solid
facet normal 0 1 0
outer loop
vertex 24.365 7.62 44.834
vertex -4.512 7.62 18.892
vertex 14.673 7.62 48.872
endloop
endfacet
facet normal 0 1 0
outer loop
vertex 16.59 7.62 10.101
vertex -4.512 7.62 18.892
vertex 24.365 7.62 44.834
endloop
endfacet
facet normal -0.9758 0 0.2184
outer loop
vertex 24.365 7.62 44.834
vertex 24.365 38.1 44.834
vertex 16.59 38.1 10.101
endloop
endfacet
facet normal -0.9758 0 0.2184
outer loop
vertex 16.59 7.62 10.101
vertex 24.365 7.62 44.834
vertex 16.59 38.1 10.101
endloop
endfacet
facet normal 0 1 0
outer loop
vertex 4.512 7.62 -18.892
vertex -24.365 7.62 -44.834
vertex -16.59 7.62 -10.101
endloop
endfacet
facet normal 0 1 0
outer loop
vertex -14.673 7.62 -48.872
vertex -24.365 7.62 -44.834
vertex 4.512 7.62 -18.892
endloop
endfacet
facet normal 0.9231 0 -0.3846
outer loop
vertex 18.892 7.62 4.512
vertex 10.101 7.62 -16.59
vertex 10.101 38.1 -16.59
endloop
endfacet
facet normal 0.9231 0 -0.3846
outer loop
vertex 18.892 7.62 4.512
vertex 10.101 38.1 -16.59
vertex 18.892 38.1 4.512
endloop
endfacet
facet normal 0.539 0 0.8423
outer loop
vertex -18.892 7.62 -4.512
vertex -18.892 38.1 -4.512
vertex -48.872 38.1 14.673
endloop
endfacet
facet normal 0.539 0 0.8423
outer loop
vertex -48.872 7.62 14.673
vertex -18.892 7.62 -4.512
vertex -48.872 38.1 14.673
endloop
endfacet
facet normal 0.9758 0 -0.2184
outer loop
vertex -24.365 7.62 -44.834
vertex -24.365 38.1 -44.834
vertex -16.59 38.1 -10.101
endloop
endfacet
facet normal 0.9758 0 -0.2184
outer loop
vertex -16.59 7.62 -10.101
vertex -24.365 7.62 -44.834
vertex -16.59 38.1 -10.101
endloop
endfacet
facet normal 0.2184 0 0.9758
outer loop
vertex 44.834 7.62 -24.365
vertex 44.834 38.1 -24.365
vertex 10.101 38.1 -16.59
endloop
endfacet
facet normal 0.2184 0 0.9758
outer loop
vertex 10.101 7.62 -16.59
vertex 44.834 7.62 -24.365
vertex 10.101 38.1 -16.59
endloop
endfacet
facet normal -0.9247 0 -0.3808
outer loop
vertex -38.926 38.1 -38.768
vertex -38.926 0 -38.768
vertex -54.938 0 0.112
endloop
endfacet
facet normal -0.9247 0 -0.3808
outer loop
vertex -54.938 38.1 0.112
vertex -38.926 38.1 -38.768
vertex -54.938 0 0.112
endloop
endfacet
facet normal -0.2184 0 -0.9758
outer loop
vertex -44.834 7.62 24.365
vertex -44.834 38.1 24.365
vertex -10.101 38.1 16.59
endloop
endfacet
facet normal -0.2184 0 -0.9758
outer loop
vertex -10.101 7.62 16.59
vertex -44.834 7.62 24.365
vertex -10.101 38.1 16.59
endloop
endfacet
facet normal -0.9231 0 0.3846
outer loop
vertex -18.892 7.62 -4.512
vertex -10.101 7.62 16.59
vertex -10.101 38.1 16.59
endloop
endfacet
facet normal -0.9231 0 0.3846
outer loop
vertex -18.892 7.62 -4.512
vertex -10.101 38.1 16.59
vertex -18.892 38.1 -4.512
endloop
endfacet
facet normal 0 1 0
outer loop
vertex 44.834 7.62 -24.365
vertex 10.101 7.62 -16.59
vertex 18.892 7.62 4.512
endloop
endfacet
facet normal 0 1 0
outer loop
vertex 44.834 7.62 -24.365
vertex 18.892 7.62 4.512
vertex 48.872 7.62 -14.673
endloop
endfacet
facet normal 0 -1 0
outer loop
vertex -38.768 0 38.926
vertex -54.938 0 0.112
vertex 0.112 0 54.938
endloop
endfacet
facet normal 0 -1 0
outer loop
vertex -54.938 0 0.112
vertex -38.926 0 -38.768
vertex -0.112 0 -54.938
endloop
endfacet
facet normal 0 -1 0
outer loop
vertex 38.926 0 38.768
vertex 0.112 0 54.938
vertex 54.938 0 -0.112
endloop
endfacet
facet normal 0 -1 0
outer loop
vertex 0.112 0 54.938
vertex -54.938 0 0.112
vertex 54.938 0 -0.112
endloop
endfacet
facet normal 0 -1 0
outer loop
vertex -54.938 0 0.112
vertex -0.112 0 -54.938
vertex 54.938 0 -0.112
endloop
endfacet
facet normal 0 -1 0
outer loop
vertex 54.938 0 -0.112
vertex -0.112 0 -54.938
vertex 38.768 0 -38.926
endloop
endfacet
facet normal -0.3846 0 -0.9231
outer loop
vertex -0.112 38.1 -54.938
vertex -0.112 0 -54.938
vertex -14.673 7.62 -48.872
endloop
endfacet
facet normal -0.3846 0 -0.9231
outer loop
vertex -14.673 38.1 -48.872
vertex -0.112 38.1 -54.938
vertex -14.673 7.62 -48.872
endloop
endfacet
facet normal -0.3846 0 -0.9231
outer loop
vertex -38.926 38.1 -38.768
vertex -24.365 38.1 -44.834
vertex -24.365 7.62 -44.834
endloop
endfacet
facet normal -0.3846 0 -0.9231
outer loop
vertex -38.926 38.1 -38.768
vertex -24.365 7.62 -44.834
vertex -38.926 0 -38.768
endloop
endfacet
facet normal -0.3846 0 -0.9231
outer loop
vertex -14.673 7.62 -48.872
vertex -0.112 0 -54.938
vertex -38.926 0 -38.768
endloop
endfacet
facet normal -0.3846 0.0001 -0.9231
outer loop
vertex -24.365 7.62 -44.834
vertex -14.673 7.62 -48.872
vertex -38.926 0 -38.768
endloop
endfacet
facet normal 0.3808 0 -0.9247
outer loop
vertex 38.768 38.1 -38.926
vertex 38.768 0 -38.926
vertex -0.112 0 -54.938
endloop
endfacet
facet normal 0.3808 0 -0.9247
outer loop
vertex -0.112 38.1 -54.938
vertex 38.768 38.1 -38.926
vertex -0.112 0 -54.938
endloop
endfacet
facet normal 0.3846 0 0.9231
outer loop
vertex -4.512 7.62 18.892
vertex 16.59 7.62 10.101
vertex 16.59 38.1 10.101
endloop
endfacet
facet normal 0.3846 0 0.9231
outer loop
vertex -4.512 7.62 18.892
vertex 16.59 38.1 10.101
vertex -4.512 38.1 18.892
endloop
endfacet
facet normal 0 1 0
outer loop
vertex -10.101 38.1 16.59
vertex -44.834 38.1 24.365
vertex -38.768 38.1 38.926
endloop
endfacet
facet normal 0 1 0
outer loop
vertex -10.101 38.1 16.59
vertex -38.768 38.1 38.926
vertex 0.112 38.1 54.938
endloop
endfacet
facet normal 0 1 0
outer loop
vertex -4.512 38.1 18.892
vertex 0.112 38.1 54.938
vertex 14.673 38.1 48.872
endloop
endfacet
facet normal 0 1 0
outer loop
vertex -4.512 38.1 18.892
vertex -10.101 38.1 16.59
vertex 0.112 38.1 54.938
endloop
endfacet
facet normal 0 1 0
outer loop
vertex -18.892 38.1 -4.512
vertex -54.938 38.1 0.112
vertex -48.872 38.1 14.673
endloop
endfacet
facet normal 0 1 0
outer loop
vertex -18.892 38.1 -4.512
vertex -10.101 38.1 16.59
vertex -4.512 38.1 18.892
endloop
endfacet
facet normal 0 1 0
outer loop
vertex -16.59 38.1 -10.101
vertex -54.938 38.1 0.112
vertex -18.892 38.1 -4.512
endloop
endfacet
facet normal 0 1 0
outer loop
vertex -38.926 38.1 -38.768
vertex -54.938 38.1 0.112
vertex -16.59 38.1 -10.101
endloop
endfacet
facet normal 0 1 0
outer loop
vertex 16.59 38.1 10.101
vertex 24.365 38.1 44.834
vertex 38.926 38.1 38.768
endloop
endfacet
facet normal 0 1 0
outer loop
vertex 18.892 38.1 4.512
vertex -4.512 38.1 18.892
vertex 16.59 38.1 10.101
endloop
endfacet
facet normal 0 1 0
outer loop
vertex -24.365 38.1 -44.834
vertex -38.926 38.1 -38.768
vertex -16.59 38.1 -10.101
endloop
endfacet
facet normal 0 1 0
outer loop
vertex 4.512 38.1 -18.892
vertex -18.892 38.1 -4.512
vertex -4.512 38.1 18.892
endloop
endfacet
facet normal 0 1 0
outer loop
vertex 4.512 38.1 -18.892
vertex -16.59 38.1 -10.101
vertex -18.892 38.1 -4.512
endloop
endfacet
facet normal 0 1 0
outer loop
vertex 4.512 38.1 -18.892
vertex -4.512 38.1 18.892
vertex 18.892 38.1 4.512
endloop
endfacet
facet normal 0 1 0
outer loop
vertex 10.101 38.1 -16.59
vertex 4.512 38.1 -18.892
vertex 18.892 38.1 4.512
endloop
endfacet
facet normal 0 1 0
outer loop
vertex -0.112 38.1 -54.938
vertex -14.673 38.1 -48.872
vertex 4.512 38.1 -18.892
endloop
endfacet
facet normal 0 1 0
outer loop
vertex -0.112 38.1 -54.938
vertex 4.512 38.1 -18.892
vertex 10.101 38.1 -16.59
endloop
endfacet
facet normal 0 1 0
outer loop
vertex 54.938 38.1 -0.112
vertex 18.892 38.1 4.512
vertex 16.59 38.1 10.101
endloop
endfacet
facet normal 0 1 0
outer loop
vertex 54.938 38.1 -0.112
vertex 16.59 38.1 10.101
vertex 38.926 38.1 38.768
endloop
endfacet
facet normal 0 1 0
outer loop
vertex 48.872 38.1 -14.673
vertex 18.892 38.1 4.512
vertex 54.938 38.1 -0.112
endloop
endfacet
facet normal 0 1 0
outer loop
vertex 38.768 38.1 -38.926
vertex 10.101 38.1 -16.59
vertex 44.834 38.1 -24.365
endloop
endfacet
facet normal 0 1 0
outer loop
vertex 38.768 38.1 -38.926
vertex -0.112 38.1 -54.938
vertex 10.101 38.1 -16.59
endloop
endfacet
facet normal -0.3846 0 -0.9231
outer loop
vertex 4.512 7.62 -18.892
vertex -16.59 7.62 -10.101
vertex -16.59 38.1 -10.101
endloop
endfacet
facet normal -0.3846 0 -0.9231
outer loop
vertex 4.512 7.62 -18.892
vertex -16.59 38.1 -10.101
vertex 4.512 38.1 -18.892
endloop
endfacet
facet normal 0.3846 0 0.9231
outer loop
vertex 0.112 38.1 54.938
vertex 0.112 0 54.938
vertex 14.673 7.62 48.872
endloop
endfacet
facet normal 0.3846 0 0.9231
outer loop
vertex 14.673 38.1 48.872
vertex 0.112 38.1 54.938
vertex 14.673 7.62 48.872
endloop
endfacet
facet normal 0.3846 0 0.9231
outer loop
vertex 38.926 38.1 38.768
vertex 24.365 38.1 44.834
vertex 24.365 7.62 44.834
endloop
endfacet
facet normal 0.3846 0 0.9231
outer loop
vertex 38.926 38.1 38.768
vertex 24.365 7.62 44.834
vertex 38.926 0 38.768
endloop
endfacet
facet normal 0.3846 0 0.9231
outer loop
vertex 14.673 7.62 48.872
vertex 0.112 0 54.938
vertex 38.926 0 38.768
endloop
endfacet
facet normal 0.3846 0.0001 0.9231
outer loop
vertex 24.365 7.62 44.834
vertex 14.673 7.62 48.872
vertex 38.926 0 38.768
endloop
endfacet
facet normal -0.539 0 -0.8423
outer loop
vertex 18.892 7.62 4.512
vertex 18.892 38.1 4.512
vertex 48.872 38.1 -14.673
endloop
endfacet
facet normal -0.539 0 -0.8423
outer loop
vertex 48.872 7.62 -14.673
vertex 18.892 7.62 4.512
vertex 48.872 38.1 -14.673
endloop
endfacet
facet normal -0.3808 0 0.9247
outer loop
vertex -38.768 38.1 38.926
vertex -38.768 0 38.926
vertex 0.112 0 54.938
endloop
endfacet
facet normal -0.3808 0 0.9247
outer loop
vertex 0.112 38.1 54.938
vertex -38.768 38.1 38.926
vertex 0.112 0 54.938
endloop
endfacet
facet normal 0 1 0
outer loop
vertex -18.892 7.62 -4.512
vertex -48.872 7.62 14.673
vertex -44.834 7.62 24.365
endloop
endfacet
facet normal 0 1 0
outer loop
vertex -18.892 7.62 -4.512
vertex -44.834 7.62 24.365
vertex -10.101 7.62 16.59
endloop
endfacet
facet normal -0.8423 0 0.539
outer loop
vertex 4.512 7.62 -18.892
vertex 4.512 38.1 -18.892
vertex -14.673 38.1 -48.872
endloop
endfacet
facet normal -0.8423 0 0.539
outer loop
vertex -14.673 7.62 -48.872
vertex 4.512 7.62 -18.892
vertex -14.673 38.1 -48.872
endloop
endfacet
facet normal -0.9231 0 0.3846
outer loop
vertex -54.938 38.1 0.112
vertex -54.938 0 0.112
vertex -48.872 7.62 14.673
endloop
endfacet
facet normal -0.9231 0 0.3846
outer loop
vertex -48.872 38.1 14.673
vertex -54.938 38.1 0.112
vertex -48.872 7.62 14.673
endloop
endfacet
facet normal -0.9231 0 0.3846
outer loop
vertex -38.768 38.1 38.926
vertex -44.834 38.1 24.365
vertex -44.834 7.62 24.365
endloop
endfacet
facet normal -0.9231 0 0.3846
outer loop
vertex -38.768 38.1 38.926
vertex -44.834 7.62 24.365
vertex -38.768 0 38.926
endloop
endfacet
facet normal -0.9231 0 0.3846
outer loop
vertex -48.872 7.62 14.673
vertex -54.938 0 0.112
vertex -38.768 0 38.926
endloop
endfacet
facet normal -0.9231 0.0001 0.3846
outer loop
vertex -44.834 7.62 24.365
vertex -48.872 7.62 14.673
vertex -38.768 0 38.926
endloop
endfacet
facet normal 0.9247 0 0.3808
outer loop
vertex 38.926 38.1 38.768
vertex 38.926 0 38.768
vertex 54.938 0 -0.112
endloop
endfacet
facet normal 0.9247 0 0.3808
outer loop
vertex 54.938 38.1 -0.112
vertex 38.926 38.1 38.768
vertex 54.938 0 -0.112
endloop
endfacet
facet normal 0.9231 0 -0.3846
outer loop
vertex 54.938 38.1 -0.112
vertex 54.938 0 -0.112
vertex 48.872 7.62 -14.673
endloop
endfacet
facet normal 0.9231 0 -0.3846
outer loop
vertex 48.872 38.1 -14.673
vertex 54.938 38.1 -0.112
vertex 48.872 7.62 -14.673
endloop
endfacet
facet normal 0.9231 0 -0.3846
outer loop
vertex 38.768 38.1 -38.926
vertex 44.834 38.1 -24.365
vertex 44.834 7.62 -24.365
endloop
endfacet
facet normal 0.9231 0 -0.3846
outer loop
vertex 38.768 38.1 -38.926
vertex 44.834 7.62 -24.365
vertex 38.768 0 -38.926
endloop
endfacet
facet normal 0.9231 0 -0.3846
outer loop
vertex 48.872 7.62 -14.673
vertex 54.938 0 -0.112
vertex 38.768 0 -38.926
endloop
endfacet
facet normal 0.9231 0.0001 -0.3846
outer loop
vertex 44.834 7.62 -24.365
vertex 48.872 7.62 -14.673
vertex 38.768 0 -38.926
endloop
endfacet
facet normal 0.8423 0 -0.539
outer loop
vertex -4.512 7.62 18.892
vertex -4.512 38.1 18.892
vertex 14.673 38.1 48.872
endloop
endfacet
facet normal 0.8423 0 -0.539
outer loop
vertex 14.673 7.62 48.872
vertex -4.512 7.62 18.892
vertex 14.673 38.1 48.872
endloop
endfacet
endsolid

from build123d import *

# Parameters (mm, degrees)
BOSS_EXTRUDE1_DEPTH = 38.1
CUT_EXTRUDE1_DEPTH  = 30.48


with BuildPart() as part:
    # Sketch1 → Boss-Extrude1 (new body)
    with BuildSketch(Plane(origin=(0, 0, 0), x_dir=(1, 0, 0), z_dir=(0, 1, 0))):
        Polygon((-0.111992667, 54.937923296), (-38.926168882, 38.767787333), (-54.937923296, -0.111992667), (-38.767787333, -38.926168882), (0.111992667, -54.937923296), (38.926168882, -38.767787333), (54.937923296, 0.111992667), (38.767787333, 38.926168882), align=None)
    extrude(amount=BOSS_EXTRUDE1_DEPTH)

    # Sketch2 → Cut-Extrude1 (cut)
    with BuildSketch(Plane(origin=(0, 38.1, 0), x_dir=(1, 0, 0), z_dir=(0, 1, 0))):
        Polygon((16.590278128, -10.100852389), (-4.511730777, -18.892030932), (14.673385048, -48.8715909), (24.364776501, -44.834119729), align=None)
        Polygon((-10.100852389, -16.590278128), (-18.892030932, 4.511730777), (-48.8715909, -14.673385048), (-44.834119729, -24.364776501), align=None)
        Polygon((-16.590278128, 10.100852389), (4.511730777, 18.892030932), (-14.673385048, 48.8715909), (-24.364776501, 44.834119729), align=None)
        Polygon((10.100852389, 16.590278128), (18.892030932, -4.511730777), (48.8715909, 14.673385048), (44.834119729, 24.364776501), align=None)
    extrude(amount=-CUT_EXTRUDE1_DEPTH, mode=Mode.SUBTRACT)


solid = part.part
